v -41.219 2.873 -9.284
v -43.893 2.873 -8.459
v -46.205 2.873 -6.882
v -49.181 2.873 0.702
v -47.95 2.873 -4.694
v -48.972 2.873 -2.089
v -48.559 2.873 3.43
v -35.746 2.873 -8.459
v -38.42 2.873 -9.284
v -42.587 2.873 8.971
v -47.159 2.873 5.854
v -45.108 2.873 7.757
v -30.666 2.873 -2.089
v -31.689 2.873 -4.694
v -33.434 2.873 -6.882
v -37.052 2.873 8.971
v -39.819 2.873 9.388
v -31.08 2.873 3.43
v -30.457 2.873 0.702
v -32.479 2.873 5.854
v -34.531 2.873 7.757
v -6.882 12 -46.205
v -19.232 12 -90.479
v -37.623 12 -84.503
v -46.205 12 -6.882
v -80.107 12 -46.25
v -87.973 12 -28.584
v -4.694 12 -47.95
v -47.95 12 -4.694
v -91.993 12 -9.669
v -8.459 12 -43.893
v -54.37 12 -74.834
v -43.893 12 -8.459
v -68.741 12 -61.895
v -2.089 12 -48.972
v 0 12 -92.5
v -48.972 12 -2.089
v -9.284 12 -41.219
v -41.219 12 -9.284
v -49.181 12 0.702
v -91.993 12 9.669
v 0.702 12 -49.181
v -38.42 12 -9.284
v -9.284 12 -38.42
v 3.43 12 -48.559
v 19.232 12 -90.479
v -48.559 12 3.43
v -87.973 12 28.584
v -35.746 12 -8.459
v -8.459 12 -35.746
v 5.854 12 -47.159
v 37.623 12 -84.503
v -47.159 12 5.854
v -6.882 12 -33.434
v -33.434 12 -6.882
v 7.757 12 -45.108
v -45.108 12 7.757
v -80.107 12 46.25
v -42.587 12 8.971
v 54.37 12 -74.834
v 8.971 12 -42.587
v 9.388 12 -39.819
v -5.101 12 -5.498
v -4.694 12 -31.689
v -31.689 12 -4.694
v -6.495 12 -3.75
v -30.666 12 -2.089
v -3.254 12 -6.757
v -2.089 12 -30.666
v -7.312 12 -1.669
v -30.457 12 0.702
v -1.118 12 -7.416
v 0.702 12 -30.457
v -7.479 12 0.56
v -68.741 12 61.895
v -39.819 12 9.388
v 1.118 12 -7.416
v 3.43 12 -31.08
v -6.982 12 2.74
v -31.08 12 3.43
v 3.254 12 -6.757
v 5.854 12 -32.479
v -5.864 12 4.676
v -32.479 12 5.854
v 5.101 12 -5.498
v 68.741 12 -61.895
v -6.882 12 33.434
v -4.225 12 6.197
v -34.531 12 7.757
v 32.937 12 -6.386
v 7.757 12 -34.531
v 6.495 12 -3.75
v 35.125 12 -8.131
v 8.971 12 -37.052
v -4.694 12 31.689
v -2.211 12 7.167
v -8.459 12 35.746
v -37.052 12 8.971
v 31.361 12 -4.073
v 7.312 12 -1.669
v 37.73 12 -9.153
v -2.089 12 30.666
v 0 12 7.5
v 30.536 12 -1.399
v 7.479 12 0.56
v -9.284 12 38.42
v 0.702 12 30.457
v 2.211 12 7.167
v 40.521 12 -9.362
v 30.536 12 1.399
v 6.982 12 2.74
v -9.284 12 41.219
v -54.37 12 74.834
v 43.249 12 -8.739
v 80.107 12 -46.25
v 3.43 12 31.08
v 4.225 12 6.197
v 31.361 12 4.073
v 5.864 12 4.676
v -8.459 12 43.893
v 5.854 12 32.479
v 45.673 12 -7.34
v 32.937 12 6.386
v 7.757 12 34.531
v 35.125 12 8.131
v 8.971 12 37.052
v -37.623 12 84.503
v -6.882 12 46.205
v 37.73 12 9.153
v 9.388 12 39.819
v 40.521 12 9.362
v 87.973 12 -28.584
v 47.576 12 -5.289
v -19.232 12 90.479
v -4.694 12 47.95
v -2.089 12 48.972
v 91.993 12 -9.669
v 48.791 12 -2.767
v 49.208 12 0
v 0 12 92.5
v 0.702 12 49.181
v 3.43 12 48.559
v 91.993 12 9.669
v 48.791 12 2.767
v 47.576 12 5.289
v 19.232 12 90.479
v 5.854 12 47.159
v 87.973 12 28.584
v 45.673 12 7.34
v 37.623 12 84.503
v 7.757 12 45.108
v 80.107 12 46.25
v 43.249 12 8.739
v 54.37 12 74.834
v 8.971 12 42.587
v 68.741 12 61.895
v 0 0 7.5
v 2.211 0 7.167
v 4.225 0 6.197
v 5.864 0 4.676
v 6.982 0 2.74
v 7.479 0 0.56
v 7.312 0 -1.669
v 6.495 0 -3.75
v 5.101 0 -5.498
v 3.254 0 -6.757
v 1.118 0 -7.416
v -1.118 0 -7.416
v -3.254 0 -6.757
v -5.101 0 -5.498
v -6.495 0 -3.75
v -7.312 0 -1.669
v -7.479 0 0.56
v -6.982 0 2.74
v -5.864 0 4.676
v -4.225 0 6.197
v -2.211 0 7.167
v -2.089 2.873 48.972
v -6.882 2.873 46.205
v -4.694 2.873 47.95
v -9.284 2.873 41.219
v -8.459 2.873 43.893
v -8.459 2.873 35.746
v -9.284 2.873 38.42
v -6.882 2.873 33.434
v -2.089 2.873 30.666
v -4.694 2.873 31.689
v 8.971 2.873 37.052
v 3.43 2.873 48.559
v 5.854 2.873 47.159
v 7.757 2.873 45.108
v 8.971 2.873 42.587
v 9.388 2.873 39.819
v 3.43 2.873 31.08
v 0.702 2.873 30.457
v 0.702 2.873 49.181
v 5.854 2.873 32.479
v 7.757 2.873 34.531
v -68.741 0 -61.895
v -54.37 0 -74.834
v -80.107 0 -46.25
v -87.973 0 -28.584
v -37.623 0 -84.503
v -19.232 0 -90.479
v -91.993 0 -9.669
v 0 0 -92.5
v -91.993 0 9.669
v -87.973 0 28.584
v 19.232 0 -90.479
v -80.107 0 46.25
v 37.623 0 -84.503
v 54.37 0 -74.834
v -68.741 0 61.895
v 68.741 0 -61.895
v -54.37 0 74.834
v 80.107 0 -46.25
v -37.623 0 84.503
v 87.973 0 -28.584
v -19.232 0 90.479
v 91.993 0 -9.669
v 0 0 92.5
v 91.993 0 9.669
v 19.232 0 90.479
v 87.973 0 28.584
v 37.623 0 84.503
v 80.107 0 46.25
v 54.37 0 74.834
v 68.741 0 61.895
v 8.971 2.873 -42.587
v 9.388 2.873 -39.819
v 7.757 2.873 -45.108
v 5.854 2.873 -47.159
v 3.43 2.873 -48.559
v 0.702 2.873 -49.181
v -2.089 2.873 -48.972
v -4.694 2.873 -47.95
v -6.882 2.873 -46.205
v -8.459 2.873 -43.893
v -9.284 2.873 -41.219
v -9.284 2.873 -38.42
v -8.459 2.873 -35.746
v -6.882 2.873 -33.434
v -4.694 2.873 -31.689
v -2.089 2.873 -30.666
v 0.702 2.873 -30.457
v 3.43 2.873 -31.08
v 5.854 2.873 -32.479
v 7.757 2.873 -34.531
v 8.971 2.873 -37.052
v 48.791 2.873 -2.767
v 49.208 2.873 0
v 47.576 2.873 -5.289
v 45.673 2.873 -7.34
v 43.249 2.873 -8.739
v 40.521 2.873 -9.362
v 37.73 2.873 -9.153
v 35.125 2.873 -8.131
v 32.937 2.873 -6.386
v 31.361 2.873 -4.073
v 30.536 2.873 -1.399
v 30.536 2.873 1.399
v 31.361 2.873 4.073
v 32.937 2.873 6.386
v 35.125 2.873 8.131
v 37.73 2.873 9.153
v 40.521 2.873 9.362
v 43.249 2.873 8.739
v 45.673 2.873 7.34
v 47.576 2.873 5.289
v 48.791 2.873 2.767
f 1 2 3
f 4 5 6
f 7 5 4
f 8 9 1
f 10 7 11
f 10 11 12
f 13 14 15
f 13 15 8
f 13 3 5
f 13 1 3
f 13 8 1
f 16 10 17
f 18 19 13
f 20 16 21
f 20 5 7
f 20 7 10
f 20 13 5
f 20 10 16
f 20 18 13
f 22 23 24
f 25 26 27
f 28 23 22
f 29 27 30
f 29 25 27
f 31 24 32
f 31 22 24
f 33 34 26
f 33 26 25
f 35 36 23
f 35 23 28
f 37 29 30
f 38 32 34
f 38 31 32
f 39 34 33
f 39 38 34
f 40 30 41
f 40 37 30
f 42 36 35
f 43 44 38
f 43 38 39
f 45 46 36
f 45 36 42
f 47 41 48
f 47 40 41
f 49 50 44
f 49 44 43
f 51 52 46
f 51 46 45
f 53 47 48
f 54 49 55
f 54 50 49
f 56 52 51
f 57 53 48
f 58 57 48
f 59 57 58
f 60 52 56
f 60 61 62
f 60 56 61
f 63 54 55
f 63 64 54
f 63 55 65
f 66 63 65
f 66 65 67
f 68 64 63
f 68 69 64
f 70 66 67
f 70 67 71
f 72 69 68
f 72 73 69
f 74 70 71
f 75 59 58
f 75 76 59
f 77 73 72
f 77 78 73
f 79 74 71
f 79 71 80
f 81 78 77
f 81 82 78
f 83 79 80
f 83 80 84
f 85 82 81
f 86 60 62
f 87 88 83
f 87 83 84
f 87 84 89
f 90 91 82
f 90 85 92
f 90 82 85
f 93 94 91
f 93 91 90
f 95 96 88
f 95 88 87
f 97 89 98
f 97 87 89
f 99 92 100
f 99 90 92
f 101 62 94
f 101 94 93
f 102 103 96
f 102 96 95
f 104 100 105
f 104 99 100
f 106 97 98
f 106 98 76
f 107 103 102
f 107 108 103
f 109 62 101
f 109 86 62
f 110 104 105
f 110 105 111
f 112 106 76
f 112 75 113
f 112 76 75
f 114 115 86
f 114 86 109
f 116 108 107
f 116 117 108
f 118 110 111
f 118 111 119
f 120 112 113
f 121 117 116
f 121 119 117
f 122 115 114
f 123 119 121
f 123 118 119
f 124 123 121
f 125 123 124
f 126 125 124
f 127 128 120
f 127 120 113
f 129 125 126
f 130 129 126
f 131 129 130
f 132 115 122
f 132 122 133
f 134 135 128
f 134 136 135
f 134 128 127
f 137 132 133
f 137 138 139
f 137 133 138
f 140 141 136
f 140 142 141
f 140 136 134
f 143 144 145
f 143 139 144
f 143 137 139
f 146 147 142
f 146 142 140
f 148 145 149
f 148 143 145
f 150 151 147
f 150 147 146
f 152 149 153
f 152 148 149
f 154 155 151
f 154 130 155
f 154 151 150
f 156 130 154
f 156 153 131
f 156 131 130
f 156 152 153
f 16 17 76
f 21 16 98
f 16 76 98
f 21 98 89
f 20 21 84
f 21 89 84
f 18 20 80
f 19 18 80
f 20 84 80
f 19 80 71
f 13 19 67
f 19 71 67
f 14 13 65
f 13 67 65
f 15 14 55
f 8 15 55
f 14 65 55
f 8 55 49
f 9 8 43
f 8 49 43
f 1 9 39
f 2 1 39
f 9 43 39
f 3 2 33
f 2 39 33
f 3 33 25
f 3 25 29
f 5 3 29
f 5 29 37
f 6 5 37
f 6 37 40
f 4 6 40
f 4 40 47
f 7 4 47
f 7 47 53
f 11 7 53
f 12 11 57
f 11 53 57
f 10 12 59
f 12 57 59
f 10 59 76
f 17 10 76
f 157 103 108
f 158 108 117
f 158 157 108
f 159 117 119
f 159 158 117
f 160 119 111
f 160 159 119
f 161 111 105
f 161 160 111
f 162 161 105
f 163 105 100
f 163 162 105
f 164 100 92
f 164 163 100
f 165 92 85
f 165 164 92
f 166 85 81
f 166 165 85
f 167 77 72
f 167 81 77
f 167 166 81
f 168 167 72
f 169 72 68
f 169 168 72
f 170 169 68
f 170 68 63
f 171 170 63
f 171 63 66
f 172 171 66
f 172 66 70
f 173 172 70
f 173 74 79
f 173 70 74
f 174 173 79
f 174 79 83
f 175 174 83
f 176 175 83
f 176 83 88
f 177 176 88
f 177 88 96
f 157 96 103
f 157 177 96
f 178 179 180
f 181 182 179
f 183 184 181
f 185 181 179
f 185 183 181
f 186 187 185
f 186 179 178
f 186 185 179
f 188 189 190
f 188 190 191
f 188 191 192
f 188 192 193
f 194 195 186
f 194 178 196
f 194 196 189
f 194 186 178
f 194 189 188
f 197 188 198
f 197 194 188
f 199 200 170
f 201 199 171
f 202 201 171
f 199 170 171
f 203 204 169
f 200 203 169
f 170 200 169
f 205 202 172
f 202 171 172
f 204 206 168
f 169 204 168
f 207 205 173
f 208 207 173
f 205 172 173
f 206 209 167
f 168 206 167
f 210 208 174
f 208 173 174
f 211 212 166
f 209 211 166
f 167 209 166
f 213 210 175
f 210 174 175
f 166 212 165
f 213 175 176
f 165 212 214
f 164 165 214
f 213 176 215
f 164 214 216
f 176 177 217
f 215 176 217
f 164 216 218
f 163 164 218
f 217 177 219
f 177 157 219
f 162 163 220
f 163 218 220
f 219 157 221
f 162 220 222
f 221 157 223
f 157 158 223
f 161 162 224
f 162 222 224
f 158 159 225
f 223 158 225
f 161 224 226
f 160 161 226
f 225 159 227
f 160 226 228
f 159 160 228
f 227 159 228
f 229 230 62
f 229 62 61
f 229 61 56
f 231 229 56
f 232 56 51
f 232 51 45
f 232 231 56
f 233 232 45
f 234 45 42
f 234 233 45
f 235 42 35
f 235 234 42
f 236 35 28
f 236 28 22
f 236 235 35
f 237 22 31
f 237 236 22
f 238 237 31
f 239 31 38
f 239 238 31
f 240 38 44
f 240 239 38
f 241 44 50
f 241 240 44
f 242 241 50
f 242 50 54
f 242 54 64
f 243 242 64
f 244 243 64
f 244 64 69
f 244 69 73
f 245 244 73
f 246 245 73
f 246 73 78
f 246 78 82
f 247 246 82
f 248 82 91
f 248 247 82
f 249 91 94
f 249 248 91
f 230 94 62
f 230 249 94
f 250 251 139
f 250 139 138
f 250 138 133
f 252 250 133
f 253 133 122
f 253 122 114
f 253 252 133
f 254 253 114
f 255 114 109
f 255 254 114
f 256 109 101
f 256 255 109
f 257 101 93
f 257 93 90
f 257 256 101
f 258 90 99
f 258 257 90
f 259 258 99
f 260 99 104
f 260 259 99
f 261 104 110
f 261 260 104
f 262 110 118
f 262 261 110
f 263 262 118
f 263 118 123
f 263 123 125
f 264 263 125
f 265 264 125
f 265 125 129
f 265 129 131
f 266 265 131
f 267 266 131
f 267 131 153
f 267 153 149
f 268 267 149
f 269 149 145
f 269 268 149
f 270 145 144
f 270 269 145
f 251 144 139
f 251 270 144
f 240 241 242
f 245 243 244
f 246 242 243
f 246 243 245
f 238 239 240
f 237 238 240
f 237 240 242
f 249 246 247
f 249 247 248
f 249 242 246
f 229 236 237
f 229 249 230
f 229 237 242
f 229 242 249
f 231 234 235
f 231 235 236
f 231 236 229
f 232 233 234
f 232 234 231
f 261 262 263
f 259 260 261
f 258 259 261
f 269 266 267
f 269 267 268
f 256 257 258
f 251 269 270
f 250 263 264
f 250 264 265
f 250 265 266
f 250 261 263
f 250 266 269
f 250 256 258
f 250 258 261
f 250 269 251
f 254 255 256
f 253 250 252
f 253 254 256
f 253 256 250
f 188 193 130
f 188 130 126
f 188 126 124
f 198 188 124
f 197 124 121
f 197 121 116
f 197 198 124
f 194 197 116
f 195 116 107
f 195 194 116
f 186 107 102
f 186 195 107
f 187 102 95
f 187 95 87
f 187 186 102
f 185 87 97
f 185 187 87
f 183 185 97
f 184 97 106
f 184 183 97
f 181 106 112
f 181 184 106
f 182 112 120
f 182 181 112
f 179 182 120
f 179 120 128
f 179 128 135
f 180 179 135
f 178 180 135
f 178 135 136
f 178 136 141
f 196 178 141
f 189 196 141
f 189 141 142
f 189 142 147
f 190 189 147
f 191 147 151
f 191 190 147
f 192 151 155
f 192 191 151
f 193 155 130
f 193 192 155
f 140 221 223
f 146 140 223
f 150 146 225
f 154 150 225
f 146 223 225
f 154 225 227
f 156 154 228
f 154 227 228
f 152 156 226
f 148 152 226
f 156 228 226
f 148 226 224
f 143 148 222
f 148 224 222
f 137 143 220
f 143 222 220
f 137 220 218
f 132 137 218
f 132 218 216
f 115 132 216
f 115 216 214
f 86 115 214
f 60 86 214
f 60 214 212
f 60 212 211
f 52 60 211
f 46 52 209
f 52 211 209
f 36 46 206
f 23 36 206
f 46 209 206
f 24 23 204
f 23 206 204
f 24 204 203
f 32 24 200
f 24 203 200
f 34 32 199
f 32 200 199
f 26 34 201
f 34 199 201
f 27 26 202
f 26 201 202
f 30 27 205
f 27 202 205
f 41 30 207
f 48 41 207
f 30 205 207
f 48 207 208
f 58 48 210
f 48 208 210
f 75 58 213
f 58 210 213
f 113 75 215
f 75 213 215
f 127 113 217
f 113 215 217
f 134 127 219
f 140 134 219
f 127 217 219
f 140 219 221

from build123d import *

# Parameters (mm, degrees)
SKETCH1_R           = 92.5
BOSS_EXTRUDE1_DEPTH = 12
SKETCH2_R           = 7.5
CUT_EXTRUDE1_DEPTH  = 132.363998112
SKETCH3_R           = 9.388365159
CUT_EXTRUDE2_DEPTH  = 9.127200818
CIRPATTERN1_COUNT   = 4


with BuildPart() as part:
    # Sketch1 → Boss-Extrude1 (new body)
    with BuildSketch(Plane(origin=(0, 0, 0), x_dir=(1, 0, 0), z_dir=(0, 1, 0))):
        Circle(SKETCH1_R)
    extrude(amount=BOSS_EXTRUDE1_DEPTH)

    # Sketch2 → Cut-Extrude1 (cut, through all)
    with BuildSketch(Plane(origin=(0, 0, 0), x_dir=(1, 0, 0), z_dir=(0, 1, 0))):
        Circle(SKETCH2_R)
    extrude(amount=CUT_EXTRUDE1_DEPTH, mode=Mode.SUBTRACT)

    # Sketch3 → Cut-Extrude2 (cut)
    with BuildSketch(Plane(origin=(0, 12, 0), x_dir=(1, 0, 0), z_dir=(0, 1, 0))):
        with Locations((-39.819354828, 0)):
            Circle(SKETCH3_R)
    cut_extrude2 = extrude(amount=-CUT_EXTRUDE2_DEPTH, mode=Mode.SUBTRACT)

    # CirPattern1: Cut-Extrude2 ×4 about axis
    cirpattern1_axis = Axis((0, 0, 0), (0, 1, 0))
    for i in range(1, CIRPATTERN1_COUNT):
        add(cut_extrude2.rotate(cirpattern1_axis, i * 360 / CIRPATTERN1_COUNT), mode=Mode.SUBTRACT)


solid = part.part
